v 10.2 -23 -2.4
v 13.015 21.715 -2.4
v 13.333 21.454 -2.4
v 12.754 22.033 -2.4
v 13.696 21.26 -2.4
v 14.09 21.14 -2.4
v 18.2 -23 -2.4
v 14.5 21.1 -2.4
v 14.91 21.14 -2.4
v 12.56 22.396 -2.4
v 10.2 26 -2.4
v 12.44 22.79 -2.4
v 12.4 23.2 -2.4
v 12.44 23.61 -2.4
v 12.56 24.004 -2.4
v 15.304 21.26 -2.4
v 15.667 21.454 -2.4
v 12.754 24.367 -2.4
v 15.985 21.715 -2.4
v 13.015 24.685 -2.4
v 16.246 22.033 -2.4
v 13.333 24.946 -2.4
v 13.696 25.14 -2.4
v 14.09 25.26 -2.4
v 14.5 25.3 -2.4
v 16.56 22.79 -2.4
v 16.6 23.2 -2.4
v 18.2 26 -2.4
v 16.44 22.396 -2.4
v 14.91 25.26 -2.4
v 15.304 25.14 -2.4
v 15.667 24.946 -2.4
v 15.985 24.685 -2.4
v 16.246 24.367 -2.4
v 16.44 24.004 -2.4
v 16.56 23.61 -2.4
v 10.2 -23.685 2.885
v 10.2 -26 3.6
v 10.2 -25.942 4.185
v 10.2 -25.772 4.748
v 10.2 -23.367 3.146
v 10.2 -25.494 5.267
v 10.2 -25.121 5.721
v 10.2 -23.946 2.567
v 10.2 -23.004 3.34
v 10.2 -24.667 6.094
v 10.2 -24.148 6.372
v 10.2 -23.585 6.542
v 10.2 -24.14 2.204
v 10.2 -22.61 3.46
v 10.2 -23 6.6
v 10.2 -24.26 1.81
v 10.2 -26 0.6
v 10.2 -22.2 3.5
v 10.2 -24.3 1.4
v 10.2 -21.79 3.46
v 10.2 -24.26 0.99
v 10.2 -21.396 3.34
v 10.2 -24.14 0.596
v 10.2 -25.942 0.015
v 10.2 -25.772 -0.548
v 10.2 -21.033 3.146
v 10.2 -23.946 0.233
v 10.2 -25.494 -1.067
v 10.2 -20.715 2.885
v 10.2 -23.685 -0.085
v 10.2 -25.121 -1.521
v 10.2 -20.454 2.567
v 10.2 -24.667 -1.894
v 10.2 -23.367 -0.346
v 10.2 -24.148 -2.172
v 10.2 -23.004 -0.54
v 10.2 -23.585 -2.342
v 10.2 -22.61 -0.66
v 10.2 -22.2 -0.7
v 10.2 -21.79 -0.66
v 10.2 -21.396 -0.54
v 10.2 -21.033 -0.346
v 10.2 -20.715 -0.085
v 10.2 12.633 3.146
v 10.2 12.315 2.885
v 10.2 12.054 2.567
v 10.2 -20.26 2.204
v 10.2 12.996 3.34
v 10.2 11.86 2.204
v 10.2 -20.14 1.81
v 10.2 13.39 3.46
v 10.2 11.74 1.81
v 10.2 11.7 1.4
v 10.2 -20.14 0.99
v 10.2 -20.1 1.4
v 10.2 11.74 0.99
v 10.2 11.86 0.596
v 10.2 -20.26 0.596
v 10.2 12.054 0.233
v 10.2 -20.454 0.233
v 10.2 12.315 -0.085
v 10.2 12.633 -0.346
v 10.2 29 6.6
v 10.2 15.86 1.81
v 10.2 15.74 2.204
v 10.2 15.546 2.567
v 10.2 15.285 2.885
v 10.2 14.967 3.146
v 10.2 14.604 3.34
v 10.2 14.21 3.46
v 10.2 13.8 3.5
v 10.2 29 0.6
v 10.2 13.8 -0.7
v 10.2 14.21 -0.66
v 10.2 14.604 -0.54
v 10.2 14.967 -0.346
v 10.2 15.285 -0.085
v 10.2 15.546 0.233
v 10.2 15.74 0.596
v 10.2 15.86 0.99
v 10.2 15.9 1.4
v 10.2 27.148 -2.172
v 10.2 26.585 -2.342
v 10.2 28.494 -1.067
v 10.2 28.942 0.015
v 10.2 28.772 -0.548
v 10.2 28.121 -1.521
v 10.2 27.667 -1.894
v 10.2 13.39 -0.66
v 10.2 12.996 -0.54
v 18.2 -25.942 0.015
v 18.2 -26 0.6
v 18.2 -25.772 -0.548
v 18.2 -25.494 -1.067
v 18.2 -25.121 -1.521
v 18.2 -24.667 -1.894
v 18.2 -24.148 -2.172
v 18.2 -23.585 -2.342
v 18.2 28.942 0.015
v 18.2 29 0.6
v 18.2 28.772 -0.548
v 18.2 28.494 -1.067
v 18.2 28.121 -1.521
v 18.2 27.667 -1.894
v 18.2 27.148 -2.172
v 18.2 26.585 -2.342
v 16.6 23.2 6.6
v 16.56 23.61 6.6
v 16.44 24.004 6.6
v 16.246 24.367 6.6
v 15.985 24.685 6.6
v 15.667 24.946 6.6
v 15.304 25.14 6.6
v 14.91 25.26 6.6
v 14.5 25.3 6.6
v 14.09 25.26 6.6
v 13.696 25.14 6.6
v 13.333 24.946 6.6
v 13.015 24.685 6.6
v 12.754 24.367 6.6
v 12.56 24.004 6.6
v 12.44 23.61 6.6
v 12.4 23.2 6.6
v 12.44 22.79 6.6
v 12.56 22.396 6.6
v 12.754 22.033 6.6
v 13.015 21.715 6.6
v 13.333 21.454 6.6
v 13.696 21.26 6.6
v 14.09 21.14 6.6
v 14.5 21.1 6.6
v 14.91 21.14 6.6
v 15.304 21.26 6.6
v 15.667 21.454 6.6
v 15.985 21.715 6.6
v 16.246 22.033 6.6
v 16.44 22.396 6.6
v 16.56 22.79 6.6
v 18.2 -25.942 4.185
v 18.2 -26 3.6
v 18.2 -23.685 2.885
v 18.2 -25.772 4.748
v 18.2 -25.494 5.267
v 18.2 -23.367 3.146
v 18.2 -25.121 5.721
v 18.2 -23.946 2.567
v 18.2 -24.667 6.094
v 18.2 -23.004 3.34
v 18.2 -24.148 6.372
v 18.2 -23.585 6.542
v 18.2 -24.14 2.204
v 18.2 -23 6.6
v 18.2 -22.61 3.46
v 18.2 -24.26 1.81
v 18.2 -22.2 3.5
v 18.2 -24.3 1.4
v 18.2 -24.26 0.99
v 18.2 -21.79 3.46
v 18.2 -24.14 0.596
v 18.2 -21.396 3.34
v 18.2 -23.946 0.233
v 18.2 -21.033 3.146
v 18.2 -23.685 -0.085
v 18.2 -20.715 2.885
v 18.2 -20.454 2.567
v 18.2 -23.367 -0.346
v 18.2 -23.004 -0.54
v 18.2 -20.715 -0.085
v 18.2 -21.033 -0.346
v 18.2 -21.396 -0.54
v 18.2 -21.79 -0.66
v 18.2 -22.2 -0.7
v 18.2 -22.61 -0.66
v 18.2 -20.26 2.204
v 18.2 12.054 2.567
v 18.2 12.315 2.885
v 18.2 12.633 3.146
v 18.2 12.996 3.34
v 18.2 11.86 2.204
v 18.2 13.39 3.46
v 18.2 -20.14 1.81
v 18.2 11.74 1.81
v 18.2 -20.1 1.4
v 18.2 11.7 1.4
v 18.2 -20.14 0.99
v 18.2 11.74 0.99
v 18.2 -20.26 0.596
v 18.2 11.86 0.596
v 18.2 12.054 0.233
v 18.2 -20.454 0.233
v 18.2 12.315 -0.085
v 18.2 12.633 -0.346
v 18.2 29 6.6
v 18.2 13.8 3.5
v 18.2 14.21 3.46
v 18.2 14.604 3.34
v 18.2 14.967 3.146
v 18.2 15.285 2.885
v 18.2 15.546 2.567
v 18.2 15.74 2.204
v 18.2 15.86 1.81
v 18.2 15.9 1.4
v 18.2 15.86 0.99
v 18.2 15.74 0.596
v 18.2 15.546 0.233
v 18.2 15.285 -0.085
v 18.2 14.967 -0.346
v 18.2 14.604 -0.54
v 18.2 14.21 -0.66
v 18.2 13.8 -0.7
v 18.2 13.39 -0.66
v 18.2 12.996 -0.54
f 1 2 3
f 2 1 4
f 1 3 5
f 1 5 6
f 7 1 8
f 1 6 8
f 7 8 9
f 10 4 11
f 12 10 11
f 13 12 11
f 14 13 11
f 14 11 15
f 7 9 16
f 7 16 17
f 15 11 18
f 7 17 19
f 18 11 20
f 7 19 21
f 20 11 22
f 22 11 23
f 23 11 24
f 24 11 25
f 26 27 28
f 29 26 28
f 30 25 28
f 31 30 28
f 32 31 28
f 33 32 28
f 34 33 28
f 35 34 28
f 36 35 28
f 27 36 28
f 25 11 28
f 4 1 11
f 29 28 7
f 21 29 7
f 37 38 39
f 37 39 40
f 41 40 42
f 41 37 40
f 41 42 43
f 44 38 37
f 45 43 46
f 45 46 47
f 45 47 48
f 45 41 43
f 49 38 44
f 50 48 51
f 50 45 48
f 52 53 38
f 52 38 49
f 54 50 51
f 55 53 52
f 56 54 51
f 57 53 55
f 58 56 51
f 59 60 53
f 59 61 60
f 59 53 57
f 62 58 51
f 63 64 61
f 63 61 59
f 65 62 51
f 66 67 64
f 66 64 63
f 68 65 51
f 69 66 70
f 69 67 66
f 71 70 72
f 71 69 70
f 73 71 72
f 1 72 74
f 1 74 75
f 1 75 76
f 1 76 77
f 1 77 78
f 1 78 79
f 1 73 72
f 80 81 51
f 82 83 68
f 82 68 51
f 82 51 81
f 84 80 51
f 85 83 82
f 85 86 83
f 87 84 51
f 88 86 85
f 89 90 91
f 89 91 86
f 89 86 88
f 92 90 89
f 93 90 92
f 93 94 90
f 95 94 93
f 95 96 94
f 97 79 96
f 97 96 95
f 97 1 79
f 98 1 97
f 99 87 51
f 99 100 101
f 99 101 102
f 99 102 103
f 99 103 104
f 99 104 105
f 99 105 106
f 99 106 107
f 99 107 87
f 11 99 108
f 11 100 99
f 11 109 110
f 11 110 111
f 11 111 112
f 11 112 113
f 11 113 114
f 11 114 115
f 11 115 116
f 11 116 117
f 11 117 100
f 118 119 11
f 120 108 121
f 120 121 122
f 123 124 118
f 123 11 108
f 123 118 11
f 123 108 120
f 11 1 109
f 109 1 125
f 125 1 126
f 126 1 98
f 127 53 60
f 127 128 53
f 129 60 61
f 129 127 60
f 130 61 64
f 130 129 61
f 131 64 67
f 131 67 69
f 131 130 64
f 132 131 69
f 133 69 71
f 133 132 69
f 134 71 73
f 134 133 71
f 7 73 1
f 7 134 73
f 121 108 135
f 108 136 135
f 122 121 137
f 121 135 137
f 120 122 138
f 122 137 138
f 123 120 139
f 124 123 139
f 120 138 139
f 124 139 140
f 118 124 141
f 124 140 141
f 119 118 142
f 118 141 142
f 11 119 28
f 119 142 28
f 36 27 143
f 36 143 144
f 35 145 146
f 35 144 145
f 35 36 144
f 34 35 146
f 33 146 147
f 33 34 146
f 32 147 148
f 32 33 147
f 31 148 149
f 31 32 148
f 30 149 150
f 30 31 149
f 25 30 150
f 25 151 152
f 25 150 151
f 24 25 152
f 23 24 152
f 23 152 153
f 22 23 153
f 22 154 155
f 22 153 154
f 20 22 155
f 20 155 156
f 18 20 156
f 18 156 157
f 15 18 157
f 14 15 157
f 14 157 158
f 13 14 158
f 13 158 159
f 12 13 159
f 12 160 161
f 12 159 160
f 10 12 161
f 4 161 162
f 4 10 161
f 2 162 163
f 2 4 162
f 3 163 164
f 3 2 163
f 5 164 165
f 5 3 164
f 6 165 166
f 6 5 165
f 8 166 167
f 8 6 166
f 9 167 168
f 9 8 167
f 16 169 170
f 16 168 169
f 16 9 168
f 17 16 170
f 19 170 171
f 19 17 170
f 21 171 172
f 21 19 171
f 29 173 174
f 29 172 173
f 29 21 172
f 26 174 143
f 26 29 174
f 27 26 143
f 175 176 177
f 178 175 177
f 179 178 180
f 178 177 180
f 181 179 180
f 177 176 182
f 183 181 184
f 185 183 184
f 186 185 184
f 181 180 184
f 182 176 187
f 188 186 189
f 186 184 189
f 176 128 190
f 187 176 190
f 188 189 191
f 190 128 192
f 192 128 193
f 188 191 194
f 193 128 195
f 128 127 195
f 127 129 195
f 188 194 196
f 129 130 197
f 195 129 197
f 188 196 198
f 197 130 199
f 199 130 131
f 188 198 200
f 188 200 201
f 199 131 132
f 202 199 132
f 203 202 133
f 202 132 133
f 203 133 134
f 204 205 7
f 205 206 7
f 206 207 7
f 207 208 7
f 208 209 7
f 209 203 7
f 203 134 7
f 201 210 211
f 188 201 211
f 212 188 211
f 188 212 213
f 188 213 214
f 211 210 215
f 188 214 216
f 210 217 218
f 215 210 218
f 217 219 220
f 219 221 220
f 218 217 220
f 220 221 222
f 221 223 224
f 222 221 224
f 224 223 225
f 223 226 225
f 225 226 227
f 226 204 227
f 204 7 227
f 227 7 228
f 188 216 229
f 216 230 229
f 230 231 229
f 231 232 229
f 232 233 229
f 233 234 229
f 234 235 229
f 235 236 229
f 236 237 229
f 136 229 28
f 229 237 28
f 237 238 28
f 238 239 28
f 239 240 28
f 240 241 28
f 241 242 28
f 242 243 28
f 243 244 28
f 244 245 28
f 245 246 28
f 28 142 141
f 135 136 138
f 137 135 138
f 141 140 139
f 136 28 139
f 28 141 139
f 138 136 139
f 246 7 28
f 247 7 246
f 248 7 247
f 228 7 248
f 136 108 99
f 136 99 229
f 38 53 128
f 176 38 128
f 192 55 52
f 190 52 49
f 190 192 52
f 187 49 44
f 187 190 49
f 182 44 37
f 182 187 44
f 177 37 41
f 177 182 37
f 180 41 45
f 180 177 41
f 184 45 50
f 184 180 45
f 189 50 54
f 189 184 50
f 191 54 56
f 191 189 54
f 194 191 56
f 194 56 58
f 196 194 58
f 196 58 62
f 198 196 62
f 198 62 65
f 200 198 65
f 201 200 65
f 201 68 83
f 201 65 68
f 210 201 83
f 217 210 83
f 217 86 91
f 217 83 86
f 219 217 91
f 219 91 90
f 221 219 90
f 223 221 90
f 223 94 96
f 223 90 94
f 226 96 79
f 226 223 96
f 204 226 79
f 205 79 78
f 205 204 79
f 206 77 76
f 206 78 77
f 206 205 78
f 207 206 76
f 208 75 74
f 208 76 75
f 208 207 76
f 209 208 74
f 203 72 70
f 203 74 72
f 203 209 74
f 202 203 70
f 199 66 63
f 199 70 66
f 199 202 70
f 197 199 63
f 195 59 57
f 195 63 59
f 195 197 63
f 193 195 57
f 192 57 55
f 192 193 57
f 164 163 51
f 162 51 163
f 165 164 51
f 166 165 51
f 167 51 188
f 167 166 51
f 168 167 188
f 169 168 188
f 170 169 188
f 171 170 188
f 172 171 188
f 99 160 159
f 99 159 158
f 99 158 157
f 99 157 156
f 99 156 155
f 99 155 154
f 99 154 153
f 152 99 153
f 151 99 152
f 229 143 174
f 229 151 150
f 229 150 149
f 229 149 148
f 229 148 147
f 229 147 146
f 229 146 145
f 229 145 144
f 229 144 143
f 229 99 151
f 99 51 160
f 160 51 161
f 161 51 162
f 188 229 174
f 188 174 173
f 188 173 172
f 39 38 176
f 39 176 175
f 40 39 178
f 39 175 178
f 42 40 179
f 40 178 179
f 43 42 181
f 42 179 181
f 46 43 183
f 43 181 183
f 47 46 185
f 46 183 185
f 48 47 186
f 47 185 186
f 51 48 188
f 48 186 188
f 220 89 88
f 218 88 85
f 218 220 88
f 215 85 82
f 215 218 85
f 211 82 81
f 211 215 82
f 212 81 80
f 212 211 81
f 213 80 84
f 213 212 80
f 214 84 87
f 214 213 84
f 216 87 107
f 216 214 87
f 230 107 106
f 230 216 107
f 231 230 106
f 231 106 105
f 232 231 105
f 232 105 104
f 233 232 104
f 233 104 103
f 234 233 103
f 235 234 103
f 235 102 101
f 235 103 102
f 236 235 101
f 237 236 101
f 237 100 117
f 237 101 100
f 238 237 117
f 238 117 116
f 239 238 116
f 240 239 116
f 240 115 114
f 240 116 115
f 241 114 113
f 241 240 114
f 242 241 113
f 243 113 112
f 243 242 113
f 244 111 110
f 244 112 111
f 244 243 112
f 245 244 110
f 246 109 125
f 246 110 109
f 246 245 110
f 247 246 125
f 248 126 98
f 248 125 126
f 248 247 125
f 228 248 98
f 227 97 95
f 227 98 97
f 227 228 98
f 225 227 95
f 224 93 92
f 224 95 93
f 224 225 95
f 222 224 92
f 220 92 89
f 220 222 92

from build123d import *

# Parameters (mm, degrees)
CYLINDER006_R     = 2.1
CYLINDER006_DEPTH = 20
SKETCH005_R       = 2.1
EXTRUDE004_DEPTH  = 10
BOX003_W          = 8
BOX003_H          = 55
BOX003_DEPTH      = 9
FILLET001_R       = 3


with BuildPart() as cs_vert_hole:
    # Cylinder006 → Cylinder006 (new body)
    with BuildSketch(Plane(origin=(14.5, 23.2, -10), x_dir=(1, 0, 0), z_dir=(0, 0, 1))):
        Circle(CYLINDER006_R)
    extrude(amount=CYLINDER006_DEPTH)


with BuildPart() as cs_hole_fusion:
    # Sketch005 (on Face2 of Box003) → Extrude004 (new body)
    with BuildSketch(Plane(origin=(18.2, 17.6, -2.4), x_dir=(0, -1, 0), z_dir=(-1, 0, 0))):
        with Locations((3.8, 3.8)):
            Circle(SKETCH005_R)
        with Locations((39.8, 3.8)):
            Circle(SKETCH005_R)
    extrude(amount=EXTRUDE004_DEPTH)

    # Fusion006: union cs vert hole
    add(cs_vert_hole.part)


with BuildPart() as cs_attachment_block:
    # Box003 → Box003 (new body)
    with BuildSketch(Plane(origin=(10.2, -26, -2.4), x_dir=(1, 0, 0), z_dir=(0, 0, 1))):
        with Locations((4, 27.5)):
            Rectangle(BOX003_W, BOX003_H)
    extrude(amount=BOX003_DEPTH)

    # Fillet001
    fillet001_edges = [cs_attachment_block.edges().sort_by_distance(p)[0] for p in [
        (14.2, -26, -2.4),
        (14.2, -26, 6.6),
        (14.2, 29, -2.4),
    ]]
    fillet(fillet001_edges, radius=FILLET001_R)

    # Cut003: cut cs hole fusion
    add(cs_hole_fusion.part, mode=Mode.SUBTRACT)


solid = cs_attachment_block.part
